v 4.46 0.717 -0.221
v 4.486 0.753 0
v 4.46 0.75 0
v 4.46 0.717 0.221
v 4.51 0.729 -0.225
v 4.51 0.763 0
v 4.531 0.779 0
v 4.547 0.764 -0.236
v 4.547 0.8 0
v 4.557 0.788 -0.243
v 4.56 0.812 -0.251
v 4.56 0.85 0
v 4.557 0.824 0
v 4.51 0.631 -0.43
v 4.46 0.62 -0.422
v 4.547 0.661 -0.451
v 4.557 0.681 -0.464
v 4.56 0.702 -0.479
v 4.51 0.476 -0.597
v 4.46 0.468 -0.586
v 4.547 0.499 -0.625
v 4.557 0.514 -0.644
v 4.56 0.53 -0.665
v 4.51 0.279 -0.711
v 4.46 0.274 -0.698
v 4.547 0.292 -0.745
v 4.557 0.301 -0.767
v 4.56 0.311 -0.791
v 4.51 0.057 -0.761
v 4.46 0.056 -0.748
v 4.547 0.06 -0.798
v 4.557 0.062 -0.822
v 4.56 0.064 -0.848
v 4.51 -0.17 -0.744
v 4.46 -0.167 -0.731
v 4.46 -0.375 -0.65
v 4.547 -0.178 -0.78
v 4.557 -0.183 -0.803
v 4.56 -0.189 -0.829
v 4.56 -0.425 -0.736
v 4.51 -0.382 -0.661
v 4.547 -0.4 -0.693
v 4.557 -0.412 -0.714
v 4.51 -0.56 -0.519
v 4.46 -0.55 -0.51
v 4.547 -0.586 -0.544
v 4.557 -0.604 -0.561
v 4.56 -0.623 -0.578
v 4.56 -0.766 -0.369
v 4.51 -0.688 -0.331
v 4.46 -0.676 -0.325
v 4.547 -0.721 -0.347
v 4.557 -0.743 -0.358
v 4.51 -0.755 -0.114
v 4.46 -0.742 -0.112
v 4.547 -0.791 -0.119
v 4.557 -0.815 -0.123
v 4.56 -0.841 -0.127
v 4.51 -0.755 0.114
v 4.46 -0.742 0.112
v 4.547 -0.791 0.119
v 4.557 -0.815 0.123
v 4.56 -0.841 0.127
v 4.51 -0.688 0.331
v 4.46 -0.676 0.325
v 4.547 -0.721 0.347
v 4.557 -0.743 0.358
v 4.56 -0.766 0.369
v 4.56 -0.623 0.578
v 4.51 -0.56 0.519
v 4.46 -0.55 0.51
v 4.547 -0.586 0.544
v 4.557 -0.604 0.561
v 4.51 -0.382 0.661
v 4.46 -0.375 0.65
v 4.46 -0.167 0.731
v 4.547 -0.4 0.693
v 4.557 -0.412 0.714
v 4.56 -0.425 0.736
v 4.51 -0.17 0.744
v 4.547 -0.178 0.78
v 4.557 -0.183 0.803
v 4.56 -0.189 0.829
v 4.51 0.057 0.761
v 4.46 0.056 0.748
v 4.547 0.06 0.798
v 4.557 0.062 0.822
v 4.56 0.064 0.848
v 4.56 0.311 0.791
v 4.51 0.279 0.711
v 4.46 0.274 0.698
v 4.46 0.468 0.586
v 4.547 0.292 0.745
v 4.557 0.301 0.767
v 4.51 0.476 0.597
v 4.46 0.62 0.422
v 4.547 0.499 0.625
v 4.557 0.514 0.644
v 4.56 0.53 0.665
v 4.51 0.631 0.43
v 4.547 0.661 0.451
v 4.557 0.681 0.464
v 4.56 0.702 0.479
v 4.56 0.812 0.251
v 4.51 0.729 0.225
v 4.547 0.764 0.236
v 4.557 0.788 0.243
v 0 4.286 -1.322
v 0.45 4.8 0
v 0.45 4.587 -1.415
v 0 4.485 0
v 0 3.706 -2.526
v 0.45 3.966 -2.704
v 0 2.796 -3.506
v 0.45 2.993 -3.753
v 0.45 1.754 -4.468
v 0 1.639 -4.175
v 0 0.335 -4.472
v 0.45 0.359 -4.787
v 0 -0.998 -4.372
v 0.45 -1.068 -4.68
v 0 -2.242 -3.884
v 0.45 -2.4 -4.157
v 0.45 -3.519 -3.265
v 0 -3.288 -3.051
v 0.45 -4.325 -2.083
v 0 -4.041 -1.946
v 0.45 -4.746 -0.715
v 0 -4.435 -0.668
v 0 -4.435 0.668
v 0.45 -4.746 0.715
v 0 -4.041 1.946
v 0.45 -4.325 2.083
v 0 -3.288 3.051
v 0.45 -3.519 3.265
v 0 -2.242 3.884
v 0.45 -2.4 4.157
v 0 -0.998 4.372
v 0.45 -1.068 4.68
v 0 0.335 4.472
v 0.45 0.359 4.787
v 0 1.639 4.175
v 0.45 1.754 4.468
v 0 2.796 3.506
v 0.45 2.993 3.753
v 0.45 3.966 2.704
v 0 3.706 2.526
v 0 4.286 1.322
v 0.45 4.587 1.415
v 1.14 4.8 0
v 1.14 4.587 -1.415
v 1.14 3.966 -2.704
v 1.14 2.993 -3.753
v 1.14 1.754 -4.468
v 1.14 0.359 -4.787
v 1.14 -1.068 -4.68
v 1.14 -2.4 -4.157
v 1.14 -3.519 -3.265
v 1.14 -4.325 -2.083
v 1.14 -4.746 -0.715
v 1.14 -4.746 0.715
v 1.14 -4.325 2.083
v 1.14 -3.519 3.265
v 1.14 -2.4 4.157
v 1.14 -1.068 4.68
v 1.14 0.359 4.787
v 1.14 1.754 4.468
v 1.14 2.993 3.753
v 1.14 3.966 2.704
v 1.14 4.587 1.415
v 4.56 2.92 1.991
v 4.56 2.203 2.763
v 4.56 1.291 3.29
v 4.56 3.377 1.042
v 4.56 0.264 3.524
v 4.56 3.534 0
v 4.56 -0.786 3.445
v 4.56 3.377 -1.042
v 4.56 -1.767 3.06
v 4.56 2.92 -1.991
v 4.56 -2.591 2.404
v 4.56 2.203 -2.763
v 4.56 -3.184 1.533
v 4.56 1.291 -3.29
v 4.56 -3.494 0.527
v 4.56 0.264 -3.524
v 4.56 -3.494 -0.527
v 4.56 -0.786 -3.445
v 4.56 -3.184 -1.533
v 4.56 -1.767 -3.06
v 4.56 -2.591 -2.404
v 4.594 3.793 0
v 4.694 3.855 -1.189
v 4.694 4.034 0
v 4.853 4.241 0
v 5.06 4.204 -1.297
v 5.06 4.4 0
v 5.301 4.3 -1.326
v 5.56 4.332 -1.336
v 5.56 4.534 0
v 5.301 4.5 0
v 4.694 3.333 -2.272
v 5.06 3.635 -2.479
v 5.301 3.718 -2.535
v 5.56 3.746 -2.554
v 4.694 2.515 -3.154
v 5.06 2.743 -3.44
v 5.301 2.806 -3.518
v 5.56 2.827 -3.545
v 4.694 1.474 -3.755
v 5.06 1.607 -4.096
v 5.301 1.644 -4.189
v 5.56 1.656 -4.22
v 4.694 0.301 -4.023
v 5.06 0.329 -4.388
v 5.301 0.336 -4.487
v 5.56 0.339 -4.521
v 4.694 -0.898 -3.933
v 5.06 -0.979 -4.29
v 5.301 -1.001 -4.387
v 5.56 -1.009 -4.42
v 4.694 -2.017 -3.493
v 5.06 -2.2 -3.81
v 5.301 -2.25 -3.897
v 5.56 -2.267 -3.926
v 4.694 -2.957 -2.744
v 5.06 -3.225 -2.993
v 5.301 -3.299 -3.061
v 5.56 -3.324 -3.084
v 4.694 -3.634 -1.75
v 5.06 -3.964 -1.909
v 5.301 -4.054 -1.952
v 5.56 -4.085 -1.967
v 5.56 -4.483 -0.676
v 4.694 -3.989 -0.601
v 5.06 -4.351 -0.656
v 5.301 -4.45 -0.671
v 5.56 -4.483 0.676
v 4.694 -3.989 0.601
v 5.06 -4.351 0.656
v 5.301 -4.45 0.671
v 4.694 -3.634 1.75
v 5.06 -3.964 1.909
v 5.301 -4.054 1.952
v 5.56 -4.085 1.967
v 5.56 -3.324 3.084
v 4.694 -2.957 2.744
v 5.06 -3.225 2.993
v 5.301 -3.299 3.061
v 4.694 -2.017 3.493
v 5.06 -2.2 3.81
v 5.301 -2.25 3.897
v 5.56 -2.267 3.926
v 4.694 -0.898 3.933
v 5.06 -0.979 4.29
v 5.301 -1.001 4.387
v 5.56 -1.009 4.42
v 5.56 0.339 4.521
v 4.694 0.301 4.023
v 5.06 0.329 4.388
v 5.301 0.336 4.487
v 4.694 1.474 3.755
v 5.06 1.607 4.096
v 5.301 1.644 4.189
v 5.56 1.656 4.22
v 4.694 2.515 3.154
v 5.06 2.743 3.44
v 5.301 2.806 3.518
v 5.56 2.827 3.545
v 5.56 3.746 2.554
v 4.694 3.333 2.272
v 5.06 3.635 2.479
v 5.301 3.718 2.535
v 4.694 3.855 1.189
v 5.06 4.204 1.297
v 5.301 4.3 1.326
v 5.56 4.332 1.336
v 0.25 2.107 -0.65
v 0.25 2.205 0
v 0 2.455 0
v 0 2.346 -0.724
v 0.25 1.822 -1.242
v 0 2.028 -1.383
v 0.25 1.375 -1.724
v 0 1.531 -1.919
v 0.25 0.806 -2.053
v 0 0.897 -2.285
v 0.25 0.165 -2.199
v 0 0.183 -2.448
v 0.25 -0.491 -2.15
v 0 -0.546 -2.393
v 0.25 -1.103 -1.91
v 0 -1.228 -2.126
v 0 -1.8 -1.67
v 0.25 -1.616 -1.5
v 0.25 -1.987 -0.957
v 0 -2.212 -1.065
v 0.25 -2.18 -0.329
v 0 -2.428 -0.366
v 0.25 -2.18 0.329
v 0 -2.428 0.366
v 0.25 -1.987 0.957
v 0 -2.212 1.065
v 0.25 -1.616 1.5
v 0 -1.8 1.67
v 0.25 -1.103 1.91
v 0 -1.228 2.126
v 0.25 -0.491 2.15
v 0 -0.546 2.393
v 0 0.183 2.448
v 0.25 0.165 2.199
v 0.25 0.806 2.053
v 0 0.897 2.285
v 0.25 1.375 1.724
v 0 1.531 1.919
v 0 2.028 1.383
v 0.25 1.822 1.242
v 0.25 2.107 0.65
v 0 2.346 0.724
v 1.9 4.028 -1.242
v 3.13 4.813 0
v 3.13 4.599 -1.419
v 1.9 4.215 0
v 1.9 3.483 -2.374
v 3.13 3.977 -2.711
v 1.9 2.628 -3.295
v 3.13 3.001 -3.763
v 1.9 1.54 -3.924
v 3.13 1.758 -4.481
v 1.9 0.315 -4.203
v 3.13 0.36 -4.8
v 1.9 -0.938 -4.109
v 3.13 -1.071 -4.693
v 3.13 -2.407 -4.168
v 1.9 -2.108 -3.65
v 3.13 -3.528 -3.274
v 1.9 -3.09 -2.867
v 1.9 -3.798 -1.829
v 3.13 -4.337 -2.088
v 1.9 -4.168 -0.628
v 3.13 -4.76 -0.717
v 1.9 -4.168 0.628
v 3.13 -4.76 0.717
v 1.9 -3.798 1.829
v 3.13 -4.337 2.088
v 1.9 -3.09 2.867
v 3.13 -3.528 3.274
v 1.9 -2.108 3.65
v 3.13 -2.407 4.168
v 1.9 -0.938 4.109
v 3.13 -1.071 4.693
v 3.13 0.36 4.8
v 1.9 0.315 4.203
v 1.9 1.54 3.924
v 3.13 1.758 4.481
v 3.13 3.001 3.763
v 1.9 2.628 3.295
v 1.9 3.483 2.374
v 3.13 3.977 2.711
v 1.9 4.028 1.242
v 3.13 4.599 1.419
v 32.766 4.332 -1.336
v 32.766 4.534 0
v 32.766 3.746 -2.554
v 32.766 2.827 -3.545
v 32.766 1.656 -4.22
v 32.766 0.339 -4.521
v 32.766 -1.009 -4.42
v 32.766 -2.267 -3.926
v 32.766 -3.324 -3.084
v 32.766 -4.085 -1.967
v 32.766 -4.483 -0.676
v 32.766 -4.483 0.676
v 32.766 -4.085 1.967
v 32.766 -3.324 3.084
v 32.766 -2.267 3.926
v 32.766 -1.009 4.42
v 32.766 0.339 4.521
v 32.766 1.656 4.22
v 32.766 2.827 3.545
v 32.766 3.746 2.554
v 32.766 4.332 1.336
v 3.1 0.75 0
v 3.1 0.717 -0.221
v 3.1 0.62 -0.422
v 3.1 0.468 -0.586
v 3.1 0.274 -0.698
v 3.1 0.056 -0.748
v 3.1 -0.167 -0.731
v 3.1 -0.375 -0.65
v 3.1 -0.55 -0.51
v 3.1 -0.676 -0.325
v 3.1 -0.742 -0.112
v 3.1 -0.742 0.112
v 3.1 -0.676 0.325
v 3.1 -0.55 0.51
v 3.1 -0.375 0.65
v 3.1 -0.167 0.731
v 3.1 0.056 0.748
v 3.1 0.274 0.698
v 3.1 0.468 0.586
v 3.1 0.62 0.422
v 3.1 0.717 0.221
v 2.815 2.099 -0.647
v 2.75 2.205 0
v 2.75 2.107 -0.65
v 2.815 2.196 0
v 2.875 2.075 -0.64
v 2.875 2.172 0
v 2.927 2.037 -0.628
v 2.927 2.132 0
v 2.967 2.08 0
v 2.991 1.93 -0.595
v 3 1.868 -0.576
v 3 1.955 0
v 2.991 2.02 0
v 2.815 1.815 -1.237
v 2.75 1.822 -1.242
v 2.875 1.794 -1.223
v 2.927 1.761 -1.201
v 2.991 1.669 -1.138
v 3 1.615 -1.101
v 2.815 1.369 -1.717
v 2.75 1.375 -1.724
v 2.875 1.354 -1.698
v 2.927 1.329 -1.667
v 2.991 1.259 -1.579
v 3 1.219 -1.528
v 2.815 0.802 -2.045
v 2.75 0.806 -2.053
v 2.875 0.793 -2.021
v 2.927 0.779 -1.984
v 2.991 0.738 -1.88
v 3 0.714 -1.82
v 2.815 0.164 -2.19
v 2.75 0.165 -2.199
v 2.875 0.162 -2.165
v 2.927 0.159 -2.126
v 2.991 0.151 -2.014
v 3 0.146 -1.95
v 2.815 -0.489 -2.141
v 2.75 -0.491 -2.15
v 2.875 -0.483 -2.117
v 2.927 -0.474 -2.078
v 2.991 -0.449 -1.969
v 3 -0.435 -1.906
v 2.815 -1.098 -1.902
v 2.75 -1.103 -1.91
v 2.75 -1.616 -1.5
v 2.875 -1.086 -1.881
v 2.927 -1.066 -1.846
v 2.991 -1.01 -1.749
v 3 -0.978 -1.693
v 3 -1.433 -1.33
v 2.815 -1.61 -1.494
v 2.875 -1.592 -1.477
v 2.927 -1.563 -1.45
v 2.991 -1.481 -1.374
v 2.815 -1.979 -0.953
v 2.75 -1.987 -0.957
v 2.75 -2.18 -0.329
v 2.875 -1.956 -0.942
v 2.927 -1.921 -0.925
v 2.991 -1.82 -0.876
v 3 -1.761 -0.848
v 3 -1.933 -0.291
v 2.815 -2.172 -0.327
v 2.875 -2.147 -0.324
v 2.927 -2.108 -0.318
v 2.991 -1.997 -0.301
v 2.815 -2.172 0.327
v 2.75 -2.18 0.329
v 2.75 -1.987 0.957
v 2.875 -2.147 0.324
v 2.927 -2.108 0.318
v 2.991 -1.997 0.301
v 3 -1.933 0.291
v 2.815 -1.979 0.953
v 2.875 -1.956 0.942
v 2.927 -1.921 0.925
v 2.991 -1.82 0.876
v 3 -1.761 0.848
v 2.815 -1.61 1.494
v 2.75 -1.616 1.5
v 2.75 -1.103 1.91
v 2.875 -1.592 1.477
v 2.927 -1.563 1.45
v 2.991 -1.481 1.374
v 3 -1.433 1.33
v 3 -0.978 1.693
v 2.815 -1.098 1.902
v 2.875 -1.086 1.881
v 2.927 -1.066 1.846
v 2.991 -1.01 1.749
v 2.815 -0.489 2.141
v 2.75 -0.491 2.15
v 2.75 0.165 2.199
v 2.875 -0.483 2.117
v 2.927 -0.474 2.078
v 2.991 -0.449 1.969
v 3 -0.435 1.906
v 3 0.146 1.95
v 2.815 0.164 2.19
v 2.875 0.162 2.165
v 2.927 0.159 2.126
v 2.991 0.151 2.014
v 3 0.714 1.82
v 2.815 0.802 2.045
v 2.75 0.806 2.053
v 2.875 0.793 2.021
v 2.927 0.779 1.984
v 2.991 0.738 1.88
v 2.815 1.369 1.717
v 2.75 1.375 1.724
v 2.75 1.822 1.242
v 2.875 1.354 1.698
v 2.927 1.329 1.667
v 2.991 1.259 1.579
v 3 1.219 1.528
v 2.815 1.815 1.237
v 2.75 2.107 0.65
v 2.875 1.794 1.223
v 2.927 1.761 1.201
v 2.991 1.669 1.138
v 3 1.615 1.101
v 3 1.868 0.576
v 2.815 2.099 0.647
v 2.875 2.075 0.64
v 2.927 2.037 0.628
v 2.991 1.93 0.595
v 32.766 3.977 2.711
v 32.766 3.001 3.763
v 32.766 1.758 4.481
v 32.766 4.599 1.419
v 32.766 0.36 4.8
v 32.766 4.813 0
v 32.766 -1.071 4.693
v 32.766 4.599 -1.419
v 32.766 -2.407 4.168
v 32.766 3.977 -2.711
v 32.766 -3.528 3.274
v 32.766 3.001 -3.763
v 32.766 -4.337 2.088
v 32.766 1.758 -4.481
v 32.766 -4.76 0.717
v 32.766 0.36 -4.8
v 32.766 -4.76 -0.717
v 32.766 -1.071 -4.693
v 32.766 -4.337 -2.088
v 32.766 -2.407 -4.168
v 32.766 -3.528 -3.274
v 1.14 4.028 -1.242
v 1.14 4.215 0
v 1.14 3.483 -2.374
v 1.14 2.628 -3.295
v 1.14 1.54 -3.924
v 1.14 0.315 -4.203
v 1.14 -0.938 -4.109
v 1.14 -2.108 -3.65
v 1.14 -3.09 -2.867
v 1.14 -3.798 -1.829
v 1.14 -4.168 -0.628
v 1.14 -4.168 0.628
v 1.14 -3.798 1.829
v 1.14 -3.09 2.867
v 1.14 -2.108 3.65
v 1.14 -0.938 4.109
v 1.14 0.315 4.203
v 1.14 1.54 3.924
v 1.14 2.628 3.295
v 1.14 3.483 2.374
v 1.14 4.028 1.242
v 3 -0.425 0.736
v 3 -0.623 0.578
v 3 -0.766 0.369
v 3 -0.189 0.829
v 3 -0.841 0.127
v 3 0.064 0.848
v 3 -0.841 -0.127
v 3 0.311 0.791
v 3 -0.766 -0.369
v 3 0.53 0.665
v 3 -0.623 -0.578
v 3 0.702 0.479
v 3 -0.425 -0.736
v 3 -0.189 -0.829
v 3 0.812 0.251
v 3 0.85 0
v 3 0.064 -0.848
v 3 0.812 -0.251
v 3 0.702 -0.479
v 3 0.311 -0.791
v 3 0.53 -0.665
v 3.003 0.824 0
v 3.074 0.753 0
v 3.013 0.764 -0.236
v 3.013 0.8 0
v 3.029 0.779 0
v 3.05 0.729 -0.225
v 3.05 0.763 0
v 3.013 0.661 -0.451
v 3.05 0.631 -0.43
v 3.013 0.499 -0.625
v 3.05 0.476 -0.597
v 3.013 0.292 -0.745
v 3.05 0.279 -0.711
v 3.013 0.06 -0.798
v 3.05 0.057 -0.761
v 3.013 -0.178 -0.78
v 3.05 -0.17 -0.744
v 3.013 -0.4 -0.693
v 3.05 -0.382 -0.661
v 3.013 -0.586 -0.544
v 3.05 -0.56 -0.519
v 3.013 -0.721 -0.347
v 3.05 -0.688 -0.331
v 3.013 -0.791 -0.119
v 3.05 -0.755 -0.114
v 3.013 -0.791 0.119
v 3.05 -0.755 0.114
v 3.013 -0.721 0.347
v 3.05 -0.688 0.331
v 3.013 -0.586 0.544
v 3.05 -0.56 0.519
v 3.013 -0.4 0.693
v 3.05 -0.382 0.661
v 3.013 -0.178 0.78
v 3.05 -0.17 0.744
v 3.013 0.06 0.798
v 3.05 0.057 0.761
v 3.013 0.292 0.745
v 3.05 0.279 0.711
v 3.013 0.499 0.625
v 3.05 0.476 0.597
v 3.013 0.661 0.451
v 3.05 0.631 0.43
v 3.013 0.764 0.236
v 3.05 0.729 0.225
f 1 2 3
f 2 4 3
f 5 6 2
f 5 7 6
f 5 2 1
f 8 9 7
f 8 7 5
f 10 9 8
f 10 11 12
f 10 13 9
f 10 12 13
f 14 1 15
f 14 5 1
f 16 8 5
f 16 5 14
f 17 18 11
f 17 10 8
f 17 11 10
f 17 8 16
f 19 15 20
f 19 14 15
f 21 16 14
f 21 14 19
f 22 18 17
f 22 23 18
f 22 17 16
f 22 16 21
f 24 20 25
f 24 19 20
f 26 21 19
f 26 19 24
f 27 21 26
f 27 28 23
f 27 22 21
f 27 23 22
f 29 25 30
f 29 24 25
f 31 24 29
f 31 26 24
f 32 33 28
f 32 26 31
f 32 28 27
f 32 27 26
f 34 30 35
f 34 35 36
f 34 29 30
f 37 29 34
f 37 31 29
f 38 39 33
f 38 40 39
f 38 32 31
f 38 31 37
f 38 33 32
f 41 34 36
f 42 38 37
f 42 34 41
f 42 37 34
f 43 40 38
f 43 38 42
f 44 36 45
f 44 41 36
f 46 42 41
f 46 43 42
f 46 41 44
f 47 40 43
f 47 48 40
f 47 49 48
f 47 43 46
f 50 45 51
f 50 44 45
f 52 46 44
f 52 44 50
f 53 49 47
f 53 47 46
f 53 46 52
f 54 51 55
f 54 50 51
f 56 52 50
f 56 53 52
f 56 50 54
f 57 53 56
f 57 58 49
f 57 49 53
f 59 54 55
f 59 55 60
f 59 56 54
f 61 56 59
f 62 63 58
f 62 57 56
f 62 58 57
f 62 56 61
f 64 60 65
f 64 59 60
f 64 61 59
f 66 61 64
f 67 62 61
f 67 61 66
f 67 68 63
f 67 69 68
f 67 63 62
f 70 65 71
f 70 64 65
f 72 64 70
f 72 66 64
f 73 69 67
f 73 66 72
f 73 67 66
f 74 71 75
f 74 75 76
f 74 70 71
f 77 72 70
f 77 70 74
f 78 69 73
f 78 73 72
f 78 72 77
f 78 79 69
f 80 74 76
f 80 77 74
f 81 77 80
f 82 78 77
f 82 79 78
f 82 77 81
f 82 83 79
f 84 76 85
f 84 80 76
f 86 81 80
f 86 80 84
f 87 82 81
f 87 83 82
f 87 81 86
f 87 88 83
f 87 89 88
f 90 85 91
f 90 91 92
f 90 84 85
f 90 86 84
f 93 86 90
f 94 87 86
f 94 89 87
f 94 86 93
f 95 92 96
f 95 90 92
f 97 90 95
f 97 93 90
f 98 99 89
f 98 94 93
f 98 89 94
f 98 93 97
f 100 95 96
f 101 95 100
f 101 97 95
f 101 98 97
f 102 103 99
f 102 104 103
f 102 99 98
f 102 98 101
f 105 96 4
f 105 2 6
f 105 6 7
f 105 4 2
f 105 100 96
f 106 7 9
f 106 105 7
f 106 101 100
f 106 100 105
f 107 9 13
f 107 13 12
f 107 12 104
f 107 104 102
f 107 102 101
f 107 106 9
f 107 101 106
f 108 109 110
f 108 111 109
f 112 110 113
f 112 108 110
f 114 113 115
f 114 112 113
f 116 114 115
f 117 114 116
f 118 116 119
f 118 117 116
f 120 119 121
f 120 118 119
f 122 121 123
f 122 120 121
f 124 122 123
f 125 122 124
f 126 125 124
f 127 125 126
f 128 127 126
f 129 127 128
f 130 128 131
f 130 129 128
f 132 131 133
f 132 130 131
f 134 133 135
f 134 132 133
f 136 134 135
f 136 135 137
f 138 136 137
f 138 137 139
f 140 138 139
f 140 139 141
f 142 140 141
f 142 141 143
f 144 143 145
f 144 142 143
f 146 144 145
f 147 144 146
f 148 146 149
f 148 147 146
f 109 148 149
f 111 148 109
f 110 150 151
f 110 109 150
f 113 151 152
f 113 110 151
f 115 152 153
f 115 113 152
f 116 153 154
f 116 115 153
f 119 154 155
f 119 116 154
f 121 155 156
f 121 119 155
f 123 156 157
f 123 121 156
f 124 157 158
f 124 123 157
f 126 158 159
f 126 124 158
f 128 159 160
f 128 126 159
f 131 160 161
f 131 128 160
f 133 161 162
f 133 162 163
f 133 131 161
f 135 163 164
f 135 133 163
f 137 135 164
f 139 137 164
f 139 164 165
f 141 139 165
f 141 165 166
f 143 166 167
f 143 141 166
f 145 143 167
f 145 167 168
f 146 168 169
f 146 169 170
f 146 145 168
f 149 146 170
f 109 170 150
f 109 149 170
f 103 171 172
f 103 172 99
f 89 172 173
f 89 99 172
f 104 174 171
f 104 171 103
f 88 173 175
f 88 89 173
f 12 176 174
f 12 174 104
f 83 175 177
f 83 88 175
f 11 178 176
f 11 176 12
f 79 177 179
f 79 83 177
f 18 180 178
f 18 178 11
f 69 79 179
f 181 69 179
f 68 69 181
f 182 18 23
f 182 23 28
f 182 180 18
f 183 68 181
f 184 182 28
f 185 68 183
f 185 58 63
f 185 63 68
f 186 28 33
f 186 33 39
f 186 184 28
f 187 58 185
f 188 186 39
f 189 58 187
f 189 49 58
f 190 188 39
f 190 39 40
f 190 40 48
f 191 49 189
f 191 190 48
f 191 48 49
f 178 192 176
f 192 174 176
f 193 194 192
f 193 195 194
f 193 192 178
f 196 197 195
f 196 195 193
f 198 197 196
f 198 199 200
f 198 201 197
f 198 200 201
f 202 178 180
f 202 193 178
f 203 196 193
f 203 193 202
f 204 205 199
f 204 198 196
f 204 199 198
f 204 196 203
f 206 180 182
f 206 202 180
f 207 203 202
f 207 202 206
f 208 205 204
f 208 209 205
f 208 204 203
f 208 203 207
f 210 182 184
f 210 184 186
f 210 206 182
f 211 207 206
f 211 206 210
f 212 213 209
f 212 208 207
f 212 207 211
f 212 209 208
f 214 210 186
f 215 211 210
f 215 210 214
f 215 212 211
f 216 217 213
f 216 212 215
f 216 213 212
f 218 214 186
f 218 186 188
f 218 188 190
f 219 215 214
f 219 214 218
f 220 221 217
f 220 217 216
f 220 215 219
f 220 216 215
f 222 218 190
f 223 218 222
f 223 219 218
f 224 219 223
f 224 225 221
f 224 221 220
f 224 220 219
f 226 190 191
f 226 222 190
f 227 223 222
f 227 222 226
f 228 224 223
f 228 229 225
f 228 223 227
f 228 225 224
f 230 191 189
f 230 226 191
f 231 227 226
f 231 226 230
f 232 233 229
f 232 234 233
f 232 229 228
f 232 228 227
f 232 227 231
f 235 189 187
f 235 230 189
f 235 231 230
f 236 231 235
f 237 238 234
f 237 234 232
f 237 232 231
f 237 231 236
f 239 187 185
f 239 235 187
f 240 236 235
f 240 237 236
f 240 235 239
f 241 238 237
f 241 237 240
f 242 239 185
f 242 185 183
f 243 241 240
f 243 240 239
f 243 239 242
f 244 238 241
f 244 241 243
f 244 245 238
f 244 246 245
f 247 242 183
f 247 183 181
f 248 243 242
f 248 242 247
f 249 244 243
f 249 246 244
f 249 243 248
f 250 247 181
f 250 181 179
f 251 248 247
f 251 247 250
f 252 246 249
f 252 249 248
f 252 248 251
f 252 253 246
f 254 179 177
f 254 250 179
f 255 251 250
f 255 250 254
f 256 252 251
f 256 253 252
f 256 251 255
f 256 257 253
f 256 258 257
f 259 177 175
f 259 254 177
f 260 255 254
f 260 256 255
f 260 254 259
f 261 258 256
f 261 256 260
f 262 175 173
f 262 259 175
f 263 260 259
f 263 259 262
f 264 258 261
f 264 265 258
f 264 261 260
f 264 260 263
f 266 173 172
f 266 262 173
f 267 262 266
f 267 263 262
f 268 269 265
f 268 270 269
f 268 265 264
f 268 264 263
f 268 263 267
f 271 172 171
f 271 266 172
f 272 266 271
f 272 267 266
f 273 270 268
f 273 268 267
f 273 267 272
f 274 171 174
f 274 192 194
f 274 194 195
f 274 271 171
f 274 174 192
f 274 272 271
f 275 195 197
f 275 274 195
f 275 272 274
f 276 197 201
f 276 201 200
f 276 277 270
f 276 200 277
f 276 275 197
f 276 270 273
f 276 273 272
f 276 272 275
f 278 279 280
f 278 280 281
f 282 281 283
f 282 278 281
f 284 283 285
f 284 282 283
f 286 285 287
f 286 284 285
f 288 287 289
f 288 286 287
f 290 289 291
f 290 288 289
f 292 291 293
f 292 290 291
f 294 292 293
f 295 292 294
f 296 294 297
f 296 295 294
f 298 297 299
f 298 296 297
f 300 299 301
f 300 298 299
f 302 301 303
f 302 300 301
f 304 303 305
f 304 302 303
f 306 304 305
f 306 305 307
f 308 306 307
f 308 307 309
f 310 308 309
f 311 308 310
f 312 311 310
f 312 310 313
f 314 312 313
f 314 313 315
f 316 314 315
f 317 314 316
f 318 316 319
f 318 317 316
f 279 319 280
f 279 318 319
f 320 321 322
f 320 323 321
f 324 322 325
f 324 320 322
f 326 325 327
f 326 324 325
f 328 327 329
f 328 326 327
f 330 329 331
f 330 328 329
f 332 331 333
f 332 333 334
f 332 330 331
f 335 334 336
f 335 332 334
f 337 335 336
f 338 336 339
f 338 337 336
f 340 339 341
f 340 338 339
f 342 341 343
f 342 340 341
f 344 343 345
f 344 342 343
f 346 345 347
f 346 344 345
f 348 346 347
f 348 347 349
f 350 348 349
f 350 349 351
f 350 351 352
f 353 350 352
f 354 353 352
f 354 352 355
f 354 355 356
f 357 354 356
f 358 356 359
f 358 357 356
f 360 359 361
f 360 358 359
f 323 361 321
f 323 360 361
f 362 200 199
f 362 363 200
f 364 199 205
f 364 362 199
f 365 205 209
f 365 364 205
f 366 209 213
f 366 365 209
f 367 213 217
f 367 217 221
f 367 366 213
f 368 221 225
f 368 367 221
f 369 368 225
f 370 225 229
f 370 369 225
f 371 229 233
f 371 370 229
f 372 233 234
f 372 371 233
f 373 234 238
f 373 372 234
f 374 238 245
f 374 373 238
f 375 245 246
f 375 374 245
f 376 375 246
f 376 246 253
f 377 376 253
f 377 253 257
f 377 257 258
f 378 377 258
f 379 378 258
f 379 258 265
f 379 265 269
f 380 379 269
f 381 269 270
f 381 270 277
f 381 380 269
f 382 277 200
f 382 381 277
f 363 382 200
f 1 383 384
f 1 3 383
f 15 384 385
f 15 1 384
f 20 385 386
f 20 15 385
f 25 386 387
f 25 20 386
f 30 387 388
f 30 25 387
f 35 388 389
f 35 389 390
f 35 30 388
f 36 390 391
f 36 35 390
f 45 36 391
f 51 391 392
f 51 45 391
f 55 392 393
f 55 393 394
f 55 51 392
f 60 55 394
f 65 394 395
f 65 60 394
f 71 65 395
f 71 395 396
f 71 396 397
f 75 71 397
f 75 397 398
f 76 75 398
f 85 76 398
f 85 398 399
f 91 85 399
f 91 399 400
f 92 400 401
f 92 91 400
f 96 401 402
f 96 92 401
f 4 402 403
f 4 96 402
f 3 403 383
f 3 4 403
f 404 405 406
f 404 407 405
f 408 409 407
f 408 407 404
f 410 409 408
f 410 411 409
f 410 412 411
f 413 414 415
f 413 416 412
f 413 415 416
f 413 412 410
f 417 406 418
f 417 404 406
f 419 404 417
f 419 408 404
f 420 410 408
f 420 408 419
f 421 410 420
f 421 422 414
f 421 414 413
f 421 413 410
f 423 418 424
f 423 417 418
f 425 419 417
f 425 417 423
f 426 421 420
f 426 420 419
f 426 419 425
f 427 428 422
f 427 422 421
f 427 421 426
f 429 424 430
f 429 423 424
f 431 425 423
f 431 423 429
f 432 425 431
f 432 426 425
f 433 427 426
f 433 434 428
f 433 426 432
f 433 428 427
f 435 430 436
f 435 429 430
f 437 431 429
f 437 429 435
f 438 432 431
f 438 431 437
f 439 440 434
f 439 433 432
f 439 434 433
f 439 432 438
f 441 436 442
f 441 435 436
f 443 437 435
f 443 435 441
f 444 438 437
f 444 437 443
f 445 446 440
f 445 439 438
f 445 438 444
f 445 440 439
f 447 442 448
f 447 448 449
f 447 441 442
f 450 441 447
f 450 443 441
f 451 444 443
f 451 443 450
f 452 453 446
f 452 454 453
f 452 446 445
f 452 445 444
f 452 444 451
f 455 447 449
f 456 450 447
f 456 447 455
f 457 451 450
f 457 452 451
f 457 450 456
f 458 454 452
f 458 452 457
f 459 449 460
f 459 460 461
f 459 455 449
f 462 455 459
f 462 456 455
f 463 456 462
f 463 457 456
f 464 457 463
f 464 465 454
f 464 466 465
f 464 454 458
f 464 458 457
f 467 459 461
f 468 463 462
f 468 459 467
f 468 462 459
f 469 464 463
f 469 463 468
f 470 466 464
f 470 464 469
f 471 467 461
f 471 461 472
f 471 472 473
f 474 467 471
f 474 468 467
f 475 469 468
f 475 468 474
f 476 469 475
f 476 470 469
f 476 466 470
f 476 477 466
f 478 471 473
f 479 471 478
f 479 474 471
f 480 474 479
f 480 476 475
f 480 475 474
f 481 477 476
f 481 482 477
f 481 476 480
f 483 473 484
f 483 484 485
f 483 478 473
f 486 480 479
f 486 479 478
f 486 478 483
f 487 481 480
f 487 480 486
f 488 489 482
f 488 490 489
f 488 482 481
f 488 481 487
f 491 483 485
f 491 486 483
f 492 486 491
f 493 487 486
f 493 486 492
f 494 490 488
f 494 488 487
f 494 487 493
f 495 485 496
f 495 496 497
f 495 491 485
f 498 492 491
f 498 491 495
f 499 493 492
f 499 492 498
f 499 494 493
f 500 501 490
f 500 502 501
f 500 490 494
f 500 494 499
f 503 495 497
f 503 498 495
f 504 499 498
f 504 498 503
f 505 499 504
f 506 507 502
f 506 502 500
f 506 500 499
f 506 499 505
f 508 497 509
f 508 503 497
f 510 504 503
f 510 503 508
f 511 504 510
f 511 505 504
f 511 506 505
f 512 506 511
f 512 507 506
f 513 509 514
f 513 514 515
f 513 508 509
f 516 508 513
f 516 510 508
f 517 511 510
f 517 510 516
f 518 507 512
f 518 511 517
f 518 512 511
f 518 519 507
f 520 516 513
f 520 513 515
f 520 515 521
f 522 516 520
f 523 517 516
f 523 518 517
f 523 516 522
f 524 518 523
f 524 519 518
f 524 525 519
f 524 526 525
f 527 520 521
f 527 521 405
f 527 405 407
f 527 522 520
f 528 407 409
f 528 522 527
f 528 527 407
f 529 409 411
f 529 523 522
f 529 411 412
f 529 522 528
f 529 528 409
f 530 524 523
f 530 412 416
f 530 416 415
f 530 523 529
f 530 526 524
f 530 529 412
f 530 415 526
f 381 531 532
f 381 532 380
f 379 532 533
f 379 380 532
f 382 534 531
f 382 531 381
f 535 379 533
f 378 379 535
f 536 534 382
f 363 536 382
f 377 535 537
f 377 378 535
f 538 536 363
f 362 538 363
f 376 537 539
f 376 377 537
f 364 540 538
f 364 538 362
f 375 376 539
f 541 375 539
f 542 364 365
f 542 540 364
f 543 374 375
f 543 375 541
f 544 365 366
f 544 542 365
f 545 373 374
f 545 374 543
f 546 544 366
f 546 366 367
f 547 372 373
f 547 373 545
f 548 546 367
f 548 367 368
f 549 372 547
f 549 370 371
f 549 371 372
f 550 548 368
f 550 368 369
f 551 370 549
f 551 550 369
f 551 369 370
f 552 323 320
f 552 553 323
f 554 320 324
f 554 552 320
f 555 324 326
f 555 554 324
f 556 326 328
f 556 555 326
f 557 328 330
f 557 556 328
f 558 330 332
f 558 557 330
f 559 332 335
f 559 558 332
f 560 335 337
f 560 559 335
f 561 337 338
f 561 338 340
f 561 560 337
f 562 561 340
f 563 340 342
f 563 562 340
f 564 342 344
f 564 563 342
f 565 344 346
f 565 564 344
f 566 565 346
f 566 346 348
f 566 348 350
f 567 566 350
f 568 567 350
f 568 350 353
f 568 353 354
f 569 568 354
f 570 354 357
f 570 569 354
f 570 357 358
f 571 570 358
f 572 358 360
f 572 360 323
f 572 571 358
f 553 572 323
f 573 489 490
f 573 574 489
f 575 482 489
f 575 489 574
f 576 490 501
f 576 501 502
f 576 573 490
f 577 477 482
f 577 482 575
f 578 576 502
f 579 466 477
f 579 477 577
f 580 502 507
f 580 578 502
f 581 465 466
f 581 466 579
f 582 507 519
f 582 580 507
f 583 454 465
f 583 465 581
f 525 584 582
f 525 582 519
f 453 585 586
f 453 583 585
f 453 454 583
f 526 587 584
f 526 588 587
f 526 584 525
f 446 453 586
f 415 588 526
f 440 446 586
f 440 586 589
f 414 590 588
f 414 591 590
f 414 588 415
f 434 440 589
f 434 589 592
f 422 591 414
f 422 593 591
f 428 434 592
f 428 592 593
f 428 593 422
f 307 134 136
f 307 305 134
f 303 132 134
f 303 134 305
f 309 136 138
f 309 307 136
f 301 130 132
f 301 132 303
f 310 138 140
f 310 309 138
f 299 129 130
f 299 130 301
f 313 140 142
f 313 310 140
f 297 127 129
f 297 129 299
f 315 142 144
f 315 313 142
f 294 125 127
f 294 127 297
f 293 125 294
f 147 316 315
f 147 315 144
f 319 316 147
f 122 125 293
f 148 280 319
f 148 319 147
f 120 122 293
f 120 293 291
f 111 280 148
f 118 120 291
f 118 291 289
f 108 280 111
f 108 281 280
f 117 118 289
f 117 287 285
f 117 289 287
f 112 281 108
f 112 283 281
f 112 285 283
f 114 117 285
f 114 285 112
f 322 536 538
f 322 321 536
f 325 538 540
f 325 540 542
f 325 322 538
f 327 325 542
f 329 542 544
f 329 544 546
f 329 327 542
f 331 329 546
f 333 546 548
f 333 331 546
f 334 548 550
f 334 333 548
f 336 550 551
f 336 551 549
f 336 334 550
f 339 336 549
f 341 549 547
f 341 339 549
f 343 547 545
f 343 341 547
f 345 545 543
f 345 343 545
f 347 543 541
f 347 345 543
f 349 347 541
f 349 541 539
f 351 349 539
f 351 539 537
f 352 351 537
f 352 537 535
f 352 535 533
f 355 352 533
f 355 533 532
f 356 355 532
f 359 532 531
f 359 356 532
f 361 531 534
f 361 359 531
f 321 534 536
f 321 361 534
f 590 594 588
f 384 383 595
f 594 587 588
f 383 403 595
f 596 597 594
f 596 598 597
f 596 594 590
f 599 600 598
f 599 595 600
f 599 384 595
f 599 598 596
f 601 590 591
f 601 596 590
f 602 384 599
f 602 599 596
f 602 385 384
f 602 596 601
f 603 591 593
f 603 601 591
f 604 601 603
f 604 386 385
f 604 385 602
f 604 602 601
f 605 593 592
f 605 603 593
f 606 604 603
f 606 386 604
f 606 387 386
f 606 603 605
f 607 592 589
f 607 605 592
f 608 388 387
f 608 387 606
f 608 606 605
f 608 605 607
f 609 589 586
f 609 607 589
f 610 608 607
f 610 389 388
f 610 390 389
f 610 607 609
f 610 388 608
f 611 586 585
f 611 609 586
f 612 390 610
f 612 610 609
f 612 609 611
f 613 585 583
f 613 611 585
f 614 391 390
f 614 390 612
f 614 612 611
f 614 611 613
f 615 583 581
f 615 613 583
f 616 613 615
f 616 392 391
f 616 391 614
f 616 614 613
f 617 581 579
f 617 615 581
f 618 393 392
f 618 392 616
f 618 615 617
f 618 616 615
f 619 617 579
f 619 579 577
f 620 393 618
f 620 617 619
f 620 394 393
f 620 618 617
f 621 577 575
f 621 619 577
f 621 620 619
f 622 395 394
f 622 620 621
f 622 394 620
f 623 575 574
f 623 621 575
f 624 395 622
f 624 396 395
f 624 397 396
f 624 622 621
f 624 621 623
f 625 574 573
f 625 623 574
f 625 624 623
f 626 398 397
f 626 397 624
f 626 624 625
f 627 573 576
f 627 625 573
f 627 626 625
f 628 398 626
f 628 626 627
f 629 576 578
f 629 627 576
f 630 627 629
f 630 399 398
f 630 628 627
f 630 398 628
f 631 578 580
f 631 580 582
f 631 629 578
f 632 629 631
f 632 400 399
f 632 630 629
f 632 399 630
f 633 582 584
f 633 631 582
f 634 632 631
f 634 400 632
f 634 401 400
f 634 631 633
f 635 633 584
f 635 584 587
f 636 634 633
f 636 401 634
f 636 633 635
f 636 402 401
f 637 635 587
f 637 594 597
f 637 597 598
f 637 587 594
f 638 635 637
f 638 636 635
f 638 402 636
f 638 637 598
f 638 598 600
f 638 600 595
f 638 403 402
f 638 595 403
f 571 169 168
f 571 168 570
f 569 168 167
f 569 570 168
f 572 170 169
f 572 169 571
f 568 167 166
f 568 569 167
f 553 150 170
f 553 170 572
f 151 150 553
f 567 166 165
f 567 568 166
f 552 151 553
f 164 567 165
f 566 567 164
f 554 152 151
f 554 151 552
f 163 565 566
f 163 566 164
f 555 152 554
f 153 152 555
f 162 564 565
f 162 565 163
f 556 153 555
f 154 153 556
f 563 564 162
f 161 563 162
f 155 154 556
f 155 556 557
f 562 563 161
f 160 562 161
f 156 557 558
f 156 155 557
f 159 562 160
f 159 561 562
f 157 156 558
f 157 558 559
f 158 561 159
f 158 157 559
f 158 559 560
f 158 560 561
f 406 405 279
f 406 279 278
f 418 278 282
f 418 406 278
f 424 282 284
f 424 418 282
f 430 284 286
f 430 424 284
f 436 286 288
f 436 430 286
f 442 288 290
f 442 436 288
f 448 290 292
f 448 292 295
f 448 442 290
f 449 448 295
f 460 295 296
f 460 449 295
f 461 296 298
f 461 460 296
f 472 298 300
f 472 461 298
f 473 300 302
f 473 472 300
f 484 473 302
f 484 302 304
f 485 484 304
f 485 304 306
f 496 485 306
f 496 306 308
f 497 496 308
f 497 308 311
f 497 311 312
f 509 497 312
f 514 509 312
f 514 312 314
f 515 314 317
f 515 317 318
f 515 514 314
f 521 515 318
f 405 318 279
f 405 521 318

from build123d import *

# Parameters (mm, degrees)
F2_SIZE = 0.25


with BuildPart() as f1:
    # F0 (on Top) → F1 (revolve)
    with BuildSketch(Plane.XY):
        with BuildLine():
            Line((0, 4.484907), (0, 2.205))
            Line((0, 2.205), (2.75, 2.205))
            ThreePointArc((2.75, 2.205), (2.926777, 2.131777), (3, 1.955))
            Line((3, 1.955), (3, 0.85))
            ThreePointArc((3, 0.85), (3.029289, 0.779289), (3.1, 0.75))
            Line((3.1, 0.75), (4.46, 0.75))
            ThreePointArc((4.46, 0.75), (4.530711, 0.779289), (4.56, 0.85))
            Line((4.56, 0.85), (4.56, 3.5339))
            ThreePointArc((4.56, 3.5339), (4.852893, 4.241007), (5.56, 4.5339))
            Line((5.56, 4.5339), (32.766, 4.5339))
            Line((32.766, 4.5339), (32.766, 4.8133))
            Line((32.766, 4.8133), (3.13, 4.8133))
            Line((3.13, 4.8133), (1.9, 4.215))
            Line((1.9, 4.215), (1.14, 4.215))
            Line((1.14, 4.215), (1.14, 4.8))
            Line((1.14, 4.8), (0.45, 4.8))
            Line((0.45, 4.8), (0, 4.484907))
        make_face()
    revolve(axis=Axis((16.383, 0, 0), (-1, 0, 0)))

    # F2
    f2_edges = [f1.edges().sort_by_distance(p)[0] for p in [
        (0, -2.205, 0),
    ]]
    chamfer(f2_edges, length=F2_SIZE)


solid = f1.part
